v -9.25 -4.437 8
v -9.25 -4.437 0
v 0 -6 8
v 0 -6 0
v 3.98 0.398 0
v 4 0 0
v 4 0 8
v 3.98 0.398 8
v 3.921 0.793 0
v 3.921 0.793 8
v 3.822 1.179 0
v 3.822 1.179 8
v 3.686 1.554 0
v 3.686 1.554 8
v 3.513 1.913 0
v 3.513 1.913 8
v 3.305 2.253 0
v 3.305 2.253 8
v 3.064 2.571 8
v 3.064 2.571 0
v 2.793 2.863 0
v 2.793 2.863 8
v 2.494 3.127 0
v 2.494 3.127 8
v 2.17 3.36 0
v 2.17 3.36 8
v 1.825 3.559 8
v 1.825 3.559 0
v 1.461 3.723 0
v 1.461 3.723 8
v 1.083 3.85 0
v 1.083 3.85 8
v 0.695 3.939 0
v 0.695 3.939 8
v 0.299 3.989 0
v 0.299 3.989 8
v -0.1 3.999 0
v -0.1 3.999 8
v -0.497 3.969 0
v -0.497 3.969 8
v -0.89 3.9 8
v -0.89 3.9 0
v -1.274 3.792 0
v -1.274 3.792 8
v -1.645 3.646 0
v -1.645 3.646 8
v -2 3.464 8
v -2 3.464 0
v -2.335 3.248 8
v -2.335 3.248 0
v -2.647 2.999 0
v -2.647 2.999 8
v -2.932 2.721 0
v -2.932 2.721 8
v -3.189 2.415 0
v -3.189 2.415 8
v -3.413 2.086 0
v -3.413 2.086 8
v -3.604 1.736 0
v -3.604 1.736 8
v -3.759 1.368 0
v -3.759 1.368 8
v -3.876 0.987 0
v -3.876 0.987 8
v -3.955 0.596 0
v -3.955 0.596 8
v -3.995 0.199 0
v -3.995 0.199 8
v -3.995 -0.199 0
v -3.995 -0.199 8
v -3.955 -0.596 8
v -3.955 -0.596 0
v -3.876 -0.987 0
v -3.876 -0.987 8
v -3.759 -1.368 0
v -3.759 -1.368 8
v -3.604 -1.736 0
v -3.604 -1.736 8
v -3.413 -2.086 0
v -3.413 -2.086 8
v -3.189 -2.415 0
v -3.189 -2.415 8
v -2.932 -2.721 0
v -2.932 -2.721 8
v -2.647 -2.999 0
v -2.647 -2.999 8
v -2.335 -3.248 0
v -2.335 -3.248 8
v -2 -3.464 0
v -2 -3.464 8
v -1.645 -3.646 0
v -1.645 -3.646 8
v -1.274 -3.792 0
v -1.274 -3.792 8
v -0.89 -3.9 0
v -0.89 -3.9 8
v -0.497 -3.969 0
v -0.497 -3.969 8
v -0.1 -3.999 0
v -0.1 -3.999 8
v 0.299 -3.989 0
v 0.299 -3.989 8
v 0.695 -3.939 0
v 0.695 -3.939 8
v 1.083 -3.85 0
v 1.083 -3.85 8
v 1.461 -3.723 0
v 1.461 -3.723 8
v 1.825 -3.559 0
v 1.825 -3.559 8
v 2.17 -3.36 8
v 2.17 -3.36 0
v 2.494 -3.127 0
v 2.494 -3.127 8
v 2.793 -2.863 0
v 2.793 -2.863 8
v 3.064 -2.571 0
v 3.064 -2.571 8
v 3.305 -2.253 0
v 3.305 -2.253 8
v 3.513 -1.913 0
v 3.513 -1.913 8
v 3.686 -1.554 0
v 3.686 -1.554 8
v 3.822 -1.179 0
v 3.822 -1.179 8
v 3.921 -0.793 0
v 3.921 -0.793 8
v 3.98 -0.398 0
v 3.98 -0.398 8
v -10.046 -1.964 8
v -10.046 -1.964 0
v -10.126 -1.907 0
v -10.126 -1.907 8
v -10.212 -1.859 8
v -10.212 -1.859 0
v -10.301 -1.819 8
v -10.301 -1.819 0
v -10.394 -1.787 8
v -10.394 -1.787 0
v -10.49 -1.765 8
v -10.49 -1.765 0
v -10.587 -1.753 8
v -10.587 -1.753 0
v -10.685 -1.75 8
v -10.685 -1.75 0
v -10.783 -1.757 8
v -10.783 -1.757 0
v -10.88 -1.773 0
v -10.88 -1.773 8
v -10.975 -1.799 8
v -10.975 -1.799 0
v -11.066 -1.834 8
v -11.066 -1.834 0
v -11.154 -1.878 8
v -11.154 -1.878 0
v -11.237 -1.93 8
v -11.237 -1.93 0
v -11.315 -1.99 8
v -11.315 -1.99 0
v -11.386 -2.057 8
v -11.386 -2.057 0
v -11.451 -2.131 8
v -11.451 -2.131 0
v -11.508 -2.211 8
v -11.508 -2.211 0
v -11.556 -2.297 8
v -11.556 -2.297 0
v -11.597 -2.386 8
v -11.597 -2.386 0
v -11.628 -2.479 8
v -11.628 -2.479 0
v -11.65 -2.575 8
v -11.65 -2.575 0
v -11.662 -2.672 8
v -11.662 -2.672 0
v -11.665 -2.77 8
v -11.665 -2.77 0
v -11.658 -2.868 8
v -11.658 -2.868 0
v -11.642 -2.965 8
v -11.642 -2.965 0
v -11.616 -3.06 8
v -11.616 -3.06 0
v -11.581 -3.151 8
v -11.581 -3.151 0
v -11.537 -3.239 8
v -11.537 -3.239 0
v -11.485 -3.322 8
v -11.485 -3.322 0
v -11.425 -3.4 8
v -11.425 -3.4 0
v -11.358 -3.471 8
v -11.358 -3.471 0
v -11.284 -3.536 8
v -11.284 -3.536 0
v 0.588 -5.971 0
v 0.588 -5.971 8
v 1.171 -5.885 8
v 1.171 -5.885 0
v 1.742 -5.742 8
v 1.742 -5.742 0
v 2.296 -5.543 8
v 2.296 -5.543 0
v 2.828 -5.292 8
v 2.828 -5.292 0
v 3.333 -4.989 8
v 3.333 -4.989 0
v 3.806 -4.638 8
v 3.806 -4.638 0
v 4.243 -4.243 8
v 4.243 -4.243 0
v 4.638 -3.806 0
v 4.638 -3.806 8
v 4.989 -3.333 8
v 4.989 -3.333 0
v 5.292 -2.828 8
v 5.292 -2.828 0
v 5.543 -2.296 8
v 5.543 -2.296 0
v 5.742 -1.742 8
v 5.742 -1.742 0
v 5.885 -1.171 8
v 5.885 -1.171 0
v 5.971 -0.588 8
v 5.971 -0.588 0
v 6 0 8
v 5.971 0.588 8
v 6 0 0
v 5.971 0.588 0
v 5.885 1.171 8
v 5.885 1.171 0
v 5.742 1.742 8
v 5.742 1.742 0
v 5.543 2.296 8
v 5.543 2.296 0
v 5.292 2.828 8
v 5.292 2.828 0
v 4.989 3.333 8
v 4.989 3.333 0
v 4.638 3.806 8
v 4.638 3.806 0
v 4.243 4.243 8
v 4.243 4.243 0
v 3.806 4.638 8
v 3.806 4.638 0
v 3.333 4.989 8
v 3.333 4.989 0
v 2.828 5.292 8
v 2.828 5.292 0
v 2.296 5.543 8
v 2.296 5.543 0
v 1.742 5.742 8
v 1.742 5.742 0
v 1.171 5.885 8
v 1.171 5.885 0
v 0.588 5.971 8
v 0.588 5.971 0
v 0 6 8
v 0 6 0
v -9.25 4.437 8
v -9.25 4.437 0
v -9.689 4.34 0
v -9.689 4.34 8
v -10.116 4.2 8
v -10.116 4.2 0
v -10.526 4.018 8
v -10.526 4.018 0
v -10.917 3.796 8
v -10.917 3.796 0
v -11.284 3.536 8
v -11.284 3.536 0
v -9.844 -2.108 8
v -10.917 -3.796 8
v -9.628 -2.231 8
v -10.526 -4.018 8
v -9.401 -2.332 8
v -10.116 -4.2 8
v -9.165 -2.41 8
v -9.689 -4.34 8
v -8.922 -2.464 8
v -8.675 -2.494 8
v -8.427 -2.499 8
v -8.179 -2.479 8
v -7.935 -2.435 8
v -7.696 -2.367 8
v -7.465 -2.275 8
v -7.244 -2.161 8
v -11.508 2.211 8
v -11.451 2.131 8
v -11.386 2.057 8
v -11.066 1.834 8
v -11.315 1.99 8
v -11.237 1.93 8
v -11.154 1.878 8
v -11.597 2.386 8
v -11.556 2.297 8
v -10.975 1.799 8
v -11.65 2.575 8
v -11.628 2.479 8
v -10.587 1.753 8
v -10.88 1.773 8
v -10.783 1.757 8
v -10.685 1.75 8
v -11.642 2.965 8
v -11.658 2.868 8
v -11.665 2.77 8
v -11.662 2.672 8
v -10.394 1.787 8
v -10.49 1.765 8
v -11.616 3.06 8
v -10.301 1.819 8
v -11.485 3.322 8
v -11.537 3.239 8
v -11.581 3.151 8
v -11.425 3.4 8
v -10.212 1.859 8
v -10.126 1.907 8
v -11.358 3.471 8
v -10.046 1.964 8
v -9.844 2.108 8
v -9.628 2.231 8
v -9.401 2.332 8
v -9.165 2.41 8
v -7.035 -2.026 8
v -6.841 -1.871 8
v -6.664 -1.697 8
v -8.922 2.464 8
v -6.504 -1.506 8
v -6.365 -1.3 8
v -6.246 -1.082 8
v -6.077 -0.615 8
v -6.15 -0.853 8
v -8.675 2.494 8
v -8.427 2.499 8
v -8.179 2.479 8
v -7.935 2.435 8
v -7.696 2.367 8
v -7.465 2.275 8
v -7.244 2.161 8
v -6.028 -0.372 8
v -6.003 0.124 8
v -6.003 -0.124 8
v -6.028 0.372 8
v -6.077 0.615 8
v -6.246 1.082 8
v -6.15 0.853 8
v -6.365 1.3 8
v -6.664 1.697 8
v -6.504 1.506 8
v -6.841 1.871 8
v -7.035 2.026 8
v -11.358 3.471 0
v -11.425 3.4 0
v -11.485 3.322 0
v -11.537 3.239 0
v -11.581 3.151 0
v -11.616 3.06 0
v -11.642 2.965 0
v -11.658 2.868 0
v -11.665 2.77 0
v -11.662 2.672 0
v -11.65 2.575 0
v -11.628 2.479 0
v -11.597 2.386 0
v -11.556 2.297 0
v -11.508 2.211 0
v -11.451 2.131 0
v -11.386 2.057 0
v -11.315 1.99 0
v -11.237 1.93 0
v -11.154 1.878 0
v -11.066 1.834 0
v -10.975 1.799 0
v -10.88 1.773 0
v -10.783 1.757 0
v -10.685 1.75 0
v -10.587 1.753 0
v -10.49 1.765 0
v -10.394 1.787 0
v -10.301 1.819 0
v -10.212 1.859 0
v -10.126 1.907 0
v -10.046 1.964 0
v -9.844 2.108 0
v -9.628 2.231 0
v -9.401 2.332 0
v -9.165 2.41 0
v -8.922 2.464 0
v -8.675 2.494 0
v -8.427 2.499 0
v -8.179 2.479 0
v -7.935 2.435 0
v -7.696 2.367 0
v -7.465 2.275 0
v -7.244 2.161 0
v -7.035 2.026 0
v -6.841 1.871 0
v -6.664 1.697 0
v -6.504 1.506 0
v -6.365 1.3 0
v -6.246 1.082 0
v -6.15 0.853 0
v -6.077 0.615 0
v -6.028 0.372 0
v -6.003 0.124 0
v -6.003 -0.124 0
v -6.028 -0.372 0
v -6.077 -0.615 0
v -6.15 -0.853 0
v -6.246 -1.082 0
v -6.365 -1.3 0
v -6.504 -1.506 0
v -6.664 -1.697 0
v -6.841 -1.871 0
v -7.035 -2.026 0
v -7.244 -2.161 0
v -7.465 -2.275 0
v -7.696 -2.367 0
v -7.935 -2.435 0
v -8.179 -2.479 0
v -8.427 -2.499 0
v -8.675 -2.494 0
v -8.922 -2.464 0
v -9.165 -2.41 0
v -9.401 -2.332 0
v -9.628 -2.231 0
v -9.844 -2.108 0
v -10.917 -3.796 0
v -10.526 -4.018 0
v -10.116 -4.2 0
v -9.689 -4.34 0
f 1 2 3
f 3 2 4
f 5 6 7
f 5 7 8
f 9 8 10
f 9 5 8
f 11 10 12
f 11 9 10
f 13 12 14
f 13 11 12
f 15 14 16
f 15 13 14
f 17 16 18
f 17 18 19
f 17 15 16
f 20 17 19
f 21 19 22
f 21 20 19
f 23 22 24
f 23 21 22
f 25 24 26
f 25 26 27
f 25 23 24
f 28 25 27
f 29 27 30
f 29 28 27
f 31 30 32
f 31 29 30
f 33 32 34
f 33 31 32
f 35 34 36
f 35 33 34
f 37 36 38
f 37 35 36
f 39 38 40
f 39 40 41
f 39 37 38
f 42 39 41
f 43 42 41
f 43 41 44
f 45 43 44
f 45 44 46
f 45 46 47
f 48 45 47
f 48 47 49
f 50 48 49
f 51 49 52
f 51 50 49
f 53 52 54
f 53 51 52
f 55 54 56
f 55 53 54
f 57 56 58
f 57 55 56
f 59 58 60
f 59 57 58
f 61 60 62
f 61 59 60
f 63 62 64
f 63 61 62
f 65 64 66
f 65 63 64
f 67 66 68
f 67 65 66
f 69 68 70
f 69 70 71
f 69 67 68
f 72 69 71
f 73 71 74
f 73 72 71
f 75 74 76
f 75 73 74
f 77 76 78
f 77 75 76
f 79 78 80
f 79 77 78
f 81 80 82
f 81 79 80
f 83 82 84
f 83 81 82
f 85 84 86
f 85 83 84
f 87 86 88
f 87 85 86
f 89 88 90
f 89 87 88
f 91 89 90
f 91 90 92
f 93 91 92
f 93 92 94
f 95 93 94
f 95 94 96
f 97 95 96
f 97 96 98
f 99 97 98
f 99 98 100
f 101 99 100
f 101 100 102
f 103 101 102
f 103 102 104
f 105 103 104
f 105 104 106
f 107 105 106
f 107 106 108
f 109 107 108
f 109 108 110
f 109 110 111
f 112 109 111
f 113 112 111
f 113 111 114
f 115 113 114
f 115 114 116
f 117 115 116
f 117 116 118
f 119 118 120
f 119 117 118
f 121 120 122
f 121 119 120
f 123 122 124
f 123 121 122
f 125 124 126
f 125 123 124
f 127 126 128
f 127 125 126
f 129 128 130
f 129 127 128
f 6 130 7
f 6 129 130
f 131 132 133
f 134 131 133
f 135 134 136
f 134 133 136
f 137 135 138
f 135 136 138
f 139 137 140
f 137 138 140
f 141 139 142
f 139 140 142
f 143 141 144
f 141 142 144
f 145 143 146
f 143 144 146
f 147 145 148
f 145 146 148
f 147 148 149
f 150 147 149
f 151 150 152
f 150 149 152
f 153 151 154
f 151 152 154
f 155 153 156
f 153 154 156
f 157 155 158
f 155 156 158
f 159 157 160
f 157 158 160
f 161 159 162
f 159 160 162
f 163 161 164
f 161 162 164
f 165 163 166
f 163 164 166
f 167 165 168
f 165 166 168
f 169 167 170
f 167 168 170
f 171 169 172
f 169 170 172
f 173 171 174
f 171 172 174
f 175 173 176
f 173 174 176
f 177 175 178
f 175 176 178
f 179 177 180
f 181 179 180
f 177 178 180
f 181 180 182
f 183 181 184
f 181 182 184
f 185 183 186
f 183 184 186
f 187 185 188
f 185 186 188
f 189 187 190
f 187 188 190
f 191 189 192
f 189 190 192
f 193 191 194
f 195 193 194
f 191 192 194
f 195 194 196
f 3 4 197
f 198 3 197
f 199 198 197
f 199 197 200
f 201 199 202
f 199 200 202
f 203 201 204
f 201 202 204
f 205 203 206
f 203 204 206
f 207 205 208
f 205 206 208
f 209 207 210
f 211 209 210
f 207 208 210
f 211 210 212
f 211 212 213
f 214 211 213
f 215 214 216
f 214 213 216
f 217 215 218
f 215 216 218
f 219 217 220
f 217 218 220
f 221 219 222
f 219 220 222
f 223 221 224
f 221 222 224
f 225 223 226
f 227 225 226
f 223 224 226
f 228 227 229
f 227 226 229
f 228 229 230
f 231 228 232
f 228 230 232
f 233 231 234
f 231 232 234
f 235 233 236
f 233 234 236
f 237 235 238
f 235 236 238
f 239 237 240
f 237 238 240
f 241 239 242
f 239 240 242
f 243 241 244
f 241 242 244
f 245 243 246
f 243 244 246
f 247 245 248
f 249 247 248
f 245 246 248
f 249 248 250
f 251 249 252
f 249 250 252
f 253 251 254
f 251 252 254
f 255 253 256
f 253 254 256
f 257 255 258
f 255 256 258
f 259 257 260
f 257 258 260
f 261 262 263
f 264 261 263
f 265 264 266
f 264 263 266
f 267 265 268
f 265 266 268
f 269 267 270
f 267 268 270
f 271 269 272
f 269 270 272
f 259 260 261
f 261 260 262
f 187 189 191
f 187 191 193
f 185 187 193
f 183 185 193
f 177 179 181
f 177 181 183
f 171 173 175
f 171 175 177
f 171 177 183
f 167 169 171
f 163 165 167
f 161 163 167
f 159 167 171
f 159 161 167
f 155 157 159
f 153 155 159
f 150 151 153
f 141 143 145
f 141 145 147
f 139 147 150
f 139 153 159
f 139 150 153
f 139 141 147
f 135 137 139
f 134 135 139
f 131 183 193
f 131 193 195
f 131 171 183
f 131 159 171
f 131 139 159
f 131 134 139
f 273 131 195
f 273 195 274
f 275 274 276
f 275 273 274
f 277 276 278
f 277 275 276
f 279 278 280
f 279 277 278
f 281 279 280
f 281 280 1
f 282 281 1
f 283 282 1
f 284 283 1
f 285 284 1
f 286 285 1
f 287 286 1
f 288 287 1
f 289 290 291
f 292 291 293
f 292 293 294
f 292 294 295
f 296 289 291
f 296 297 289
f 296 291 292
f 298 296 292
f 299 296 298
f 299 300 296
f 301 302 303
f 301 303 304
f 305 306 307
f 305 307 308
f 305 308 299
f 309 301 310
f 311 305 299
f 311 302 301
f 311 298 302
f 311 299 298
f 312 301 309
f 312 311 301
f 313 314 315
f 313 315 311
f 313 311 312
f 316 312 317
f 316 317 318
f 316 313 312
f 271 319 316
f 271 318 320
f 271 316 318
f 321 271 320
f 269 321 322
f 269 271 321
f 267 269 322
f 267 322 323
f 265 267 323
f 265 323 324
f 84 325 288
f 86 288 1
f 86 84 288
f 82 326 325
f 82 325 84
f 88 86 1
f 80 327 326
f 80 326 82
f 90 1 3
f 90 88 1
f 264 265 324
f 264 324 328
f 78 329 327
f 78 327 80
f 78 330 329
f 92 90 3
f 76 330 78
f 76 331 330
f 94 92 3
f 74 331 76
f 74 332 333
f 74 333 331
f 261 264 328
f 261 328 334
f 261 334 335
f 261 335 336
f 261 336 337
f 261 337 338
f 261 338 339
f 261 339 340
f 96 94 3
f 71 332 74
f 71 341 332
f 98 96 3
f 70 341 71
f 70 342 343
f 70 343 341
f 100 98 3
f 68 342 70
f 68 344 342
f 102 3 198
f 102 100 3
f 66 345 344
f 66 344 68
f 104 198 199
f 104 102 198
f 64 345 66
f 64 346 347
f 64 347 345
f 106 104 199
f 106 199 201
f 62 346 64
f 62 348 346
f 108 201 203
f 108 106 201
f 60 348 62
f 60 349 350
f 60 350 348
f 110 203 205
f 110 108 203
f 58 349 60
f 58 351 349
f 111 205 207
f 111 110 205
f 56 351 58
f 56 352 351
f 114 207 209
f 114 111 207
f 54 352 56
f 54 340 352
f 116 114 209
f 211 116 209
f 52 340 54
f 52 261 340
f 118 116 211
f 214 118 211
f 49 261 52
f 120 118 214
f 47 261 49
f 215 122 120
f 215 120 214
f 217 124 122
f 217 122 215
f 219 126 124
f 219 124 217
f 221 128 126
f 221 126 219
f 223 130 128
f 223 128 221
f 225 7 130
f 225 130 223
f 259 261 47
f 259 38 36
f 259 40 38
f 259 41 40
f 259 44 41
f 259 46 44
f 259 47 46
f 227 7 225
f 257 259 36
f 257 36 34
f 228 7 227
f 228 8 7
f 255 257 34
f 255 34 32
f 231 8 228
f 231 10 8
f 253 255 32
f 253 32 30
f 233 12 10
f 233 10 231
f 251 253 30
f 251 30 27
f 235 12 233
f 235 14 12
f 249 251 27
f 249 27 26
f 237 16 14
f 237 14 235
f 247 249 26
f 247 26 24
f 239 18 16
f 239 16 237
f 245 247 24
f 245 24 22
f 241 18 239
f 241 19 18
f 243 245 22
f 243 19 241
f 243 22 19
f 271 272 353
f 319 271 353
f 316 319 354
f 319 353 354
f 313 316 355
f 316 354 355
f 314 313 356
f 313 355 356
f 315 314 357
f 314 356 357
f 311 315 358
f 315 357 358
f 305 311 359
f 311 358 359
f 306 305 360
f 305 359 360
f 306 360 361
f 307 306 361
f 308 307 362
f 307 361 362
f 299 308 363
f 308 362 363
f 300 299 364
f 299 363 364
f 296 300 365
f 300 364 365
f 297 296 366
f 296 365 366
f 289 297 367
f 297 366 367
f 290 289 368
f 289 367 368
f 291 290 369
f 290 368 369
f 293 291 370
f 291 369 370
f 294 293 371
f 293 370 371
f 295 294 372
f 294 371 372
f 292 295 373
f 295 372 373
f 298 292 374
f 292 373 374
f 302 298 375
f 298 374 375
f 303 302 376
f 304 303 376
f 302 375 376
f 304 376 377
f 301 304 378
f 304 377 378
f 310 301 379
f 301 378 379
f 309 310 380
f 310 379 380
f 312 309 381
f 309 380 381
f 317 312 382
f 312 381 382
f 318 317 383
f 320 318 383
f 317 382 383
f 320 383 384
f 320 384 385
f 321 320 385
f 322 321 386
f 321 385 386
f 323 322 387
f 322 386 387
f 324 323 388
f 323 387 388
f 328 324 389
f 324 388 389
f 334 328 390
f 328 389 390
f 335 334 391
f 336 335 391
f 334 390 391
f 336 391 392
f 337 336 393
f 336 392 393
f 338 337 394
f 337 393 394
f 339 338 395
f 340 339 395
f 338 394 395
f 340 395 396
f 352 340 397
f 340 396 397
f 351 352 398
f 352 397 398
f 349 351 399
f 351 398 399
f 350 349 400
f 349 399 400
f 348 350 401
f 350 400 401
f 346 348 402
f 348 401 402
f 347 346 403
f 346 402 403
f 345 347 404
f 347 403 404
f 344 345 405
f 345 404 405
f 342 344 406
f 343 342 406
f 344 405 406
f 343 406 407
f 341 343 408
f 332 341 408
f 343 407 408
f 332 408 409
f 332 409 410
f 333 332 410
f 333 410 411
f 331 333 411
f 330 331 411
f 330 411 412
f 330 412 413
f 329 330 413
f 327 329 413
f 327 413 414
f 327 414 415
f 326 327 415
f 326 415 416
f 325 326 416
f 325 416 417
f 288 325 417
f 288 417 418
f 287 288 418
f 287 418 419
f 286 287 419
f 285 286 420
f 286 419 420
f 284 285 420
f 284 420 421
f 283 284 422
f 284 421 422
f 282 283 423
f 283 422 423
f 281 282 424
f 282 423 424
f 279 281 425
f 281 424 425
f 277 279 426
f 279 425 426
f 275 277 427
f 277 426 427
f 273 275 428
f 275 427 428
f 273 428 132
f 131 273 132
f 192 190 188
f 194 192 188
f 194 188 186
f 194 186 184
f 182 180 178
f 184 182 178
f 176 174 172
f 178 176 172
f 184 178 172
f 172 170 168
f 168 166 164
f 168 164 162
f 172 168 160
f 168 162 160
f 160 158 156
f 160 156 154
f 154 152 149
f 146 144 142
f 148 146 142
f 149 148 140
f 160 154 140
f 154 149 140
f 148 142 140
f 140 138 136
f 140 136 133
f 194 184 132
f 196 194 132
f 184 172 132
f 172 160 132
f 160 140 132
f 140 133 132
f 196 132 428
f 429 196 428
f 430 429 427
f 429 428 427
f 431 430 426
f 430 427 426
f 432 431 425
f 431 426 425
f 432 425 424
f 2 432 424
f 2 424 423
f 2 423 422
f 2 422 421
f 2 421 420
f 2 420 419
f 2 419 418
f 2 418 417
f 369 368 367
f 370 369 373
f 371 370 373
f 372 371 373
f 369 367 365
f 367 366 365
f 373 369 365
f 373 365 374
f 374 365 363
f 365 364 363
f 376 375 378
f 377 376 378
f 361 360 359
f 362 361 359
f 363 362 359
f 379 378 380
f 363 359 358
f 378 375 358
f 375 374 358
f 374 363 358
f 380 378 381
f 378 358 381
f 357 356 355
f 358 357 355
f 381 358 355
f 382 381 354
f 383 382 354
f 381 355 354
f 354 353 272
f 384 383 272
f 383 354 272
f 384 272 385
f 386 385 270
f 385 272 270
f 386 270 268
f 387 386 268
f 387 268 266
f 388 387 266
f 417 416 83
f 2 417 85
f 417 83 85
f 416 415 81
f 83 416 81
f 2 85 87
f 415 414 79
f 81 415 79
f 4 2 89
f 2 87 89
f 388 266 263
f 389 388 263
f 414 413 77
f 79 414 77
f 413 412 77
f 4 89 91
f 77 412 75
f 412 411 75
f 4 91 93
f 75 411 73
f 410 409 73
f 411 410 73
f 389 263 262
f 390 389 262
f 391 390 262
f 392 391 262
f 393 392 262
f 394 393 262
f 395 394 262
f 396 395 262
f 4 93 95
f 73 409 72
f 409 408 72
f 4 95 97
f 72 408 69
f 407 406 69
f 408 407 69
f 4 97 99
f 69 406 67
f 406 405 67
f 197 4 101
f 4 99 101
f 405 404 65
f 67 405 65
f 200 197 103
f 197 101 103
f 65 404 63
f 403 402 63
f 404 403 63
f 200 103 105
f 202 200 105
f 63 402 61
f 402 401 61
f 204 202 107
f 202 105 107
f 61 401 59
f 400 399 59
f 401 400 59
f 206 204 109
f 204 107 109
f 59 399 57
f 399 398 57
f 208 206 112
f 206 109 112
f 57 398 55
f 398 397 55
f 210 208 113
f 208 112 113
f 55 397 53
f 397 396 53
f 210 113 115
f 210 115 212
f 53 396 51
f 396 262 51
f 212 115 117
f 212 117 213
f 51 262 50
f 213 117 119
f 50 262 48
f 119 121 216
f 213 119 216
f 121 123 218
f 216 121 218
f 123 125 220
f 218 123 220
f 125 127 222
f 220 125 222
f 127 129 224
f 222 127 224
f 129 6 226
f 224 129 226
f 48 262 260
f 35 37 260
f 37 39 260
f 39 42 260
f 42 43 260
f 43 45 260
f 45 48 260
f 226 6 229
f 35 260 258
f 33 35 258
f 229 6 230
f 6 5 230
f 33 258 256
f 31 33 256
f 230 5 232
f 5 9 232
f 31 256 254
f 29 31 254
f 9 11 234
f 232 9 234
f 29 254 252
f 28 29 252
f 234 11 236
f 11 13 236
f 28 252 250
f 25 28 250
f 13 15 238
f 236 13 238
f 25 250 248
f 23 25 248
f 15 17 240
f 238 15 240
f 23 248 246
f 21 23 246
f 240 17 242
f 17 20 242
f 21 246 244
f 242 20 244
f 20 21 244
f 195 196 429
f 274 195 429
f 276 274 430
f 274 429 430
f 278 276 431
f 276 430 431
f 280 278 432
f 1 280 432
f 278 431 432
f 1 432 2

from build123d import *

# Parameters (mm, degrees)
F0_R     = 4
F1_DEPTH = 8


with BuildPart() as f1:
    # F0 (on Top) → F1 (new body)
    with BuildSketch(Plane.XY):
        with BuildLine():
            Line((-9.249722, -4.437107), (0, -6))
            ThreePointArc((0, -6), (6, 0), (0, 6))
            Line((0, 6), (-9.249722, 4.437107))
            ThreePointArc((-9.249722, 4.437107), (-10.32327, 4.114084), (-11.283653, 3.535714))
            ThreePointArc((-11.283653, 3.535714), (-11.450778, 2.13141), (-10.046474, 1.964286))
            ThreePointArc((-10.046474, 1.964286), (-6, 0), (-10.046474, -1.964286))
            ThreePointArc((-10.046474, -1.964286), (-11.450778, -2.13141), (-11.283653, -3.535714))
            ThreePointArc((-11.283653, -3.535714), (-10.32327, -4.114084), (-9.249722, -4.437107))
        make_face()
        Circle(F0_R, mode=Mode.SUBTRACT)
    extrude(amount=F1_DEPTH)


solid = f1.part
